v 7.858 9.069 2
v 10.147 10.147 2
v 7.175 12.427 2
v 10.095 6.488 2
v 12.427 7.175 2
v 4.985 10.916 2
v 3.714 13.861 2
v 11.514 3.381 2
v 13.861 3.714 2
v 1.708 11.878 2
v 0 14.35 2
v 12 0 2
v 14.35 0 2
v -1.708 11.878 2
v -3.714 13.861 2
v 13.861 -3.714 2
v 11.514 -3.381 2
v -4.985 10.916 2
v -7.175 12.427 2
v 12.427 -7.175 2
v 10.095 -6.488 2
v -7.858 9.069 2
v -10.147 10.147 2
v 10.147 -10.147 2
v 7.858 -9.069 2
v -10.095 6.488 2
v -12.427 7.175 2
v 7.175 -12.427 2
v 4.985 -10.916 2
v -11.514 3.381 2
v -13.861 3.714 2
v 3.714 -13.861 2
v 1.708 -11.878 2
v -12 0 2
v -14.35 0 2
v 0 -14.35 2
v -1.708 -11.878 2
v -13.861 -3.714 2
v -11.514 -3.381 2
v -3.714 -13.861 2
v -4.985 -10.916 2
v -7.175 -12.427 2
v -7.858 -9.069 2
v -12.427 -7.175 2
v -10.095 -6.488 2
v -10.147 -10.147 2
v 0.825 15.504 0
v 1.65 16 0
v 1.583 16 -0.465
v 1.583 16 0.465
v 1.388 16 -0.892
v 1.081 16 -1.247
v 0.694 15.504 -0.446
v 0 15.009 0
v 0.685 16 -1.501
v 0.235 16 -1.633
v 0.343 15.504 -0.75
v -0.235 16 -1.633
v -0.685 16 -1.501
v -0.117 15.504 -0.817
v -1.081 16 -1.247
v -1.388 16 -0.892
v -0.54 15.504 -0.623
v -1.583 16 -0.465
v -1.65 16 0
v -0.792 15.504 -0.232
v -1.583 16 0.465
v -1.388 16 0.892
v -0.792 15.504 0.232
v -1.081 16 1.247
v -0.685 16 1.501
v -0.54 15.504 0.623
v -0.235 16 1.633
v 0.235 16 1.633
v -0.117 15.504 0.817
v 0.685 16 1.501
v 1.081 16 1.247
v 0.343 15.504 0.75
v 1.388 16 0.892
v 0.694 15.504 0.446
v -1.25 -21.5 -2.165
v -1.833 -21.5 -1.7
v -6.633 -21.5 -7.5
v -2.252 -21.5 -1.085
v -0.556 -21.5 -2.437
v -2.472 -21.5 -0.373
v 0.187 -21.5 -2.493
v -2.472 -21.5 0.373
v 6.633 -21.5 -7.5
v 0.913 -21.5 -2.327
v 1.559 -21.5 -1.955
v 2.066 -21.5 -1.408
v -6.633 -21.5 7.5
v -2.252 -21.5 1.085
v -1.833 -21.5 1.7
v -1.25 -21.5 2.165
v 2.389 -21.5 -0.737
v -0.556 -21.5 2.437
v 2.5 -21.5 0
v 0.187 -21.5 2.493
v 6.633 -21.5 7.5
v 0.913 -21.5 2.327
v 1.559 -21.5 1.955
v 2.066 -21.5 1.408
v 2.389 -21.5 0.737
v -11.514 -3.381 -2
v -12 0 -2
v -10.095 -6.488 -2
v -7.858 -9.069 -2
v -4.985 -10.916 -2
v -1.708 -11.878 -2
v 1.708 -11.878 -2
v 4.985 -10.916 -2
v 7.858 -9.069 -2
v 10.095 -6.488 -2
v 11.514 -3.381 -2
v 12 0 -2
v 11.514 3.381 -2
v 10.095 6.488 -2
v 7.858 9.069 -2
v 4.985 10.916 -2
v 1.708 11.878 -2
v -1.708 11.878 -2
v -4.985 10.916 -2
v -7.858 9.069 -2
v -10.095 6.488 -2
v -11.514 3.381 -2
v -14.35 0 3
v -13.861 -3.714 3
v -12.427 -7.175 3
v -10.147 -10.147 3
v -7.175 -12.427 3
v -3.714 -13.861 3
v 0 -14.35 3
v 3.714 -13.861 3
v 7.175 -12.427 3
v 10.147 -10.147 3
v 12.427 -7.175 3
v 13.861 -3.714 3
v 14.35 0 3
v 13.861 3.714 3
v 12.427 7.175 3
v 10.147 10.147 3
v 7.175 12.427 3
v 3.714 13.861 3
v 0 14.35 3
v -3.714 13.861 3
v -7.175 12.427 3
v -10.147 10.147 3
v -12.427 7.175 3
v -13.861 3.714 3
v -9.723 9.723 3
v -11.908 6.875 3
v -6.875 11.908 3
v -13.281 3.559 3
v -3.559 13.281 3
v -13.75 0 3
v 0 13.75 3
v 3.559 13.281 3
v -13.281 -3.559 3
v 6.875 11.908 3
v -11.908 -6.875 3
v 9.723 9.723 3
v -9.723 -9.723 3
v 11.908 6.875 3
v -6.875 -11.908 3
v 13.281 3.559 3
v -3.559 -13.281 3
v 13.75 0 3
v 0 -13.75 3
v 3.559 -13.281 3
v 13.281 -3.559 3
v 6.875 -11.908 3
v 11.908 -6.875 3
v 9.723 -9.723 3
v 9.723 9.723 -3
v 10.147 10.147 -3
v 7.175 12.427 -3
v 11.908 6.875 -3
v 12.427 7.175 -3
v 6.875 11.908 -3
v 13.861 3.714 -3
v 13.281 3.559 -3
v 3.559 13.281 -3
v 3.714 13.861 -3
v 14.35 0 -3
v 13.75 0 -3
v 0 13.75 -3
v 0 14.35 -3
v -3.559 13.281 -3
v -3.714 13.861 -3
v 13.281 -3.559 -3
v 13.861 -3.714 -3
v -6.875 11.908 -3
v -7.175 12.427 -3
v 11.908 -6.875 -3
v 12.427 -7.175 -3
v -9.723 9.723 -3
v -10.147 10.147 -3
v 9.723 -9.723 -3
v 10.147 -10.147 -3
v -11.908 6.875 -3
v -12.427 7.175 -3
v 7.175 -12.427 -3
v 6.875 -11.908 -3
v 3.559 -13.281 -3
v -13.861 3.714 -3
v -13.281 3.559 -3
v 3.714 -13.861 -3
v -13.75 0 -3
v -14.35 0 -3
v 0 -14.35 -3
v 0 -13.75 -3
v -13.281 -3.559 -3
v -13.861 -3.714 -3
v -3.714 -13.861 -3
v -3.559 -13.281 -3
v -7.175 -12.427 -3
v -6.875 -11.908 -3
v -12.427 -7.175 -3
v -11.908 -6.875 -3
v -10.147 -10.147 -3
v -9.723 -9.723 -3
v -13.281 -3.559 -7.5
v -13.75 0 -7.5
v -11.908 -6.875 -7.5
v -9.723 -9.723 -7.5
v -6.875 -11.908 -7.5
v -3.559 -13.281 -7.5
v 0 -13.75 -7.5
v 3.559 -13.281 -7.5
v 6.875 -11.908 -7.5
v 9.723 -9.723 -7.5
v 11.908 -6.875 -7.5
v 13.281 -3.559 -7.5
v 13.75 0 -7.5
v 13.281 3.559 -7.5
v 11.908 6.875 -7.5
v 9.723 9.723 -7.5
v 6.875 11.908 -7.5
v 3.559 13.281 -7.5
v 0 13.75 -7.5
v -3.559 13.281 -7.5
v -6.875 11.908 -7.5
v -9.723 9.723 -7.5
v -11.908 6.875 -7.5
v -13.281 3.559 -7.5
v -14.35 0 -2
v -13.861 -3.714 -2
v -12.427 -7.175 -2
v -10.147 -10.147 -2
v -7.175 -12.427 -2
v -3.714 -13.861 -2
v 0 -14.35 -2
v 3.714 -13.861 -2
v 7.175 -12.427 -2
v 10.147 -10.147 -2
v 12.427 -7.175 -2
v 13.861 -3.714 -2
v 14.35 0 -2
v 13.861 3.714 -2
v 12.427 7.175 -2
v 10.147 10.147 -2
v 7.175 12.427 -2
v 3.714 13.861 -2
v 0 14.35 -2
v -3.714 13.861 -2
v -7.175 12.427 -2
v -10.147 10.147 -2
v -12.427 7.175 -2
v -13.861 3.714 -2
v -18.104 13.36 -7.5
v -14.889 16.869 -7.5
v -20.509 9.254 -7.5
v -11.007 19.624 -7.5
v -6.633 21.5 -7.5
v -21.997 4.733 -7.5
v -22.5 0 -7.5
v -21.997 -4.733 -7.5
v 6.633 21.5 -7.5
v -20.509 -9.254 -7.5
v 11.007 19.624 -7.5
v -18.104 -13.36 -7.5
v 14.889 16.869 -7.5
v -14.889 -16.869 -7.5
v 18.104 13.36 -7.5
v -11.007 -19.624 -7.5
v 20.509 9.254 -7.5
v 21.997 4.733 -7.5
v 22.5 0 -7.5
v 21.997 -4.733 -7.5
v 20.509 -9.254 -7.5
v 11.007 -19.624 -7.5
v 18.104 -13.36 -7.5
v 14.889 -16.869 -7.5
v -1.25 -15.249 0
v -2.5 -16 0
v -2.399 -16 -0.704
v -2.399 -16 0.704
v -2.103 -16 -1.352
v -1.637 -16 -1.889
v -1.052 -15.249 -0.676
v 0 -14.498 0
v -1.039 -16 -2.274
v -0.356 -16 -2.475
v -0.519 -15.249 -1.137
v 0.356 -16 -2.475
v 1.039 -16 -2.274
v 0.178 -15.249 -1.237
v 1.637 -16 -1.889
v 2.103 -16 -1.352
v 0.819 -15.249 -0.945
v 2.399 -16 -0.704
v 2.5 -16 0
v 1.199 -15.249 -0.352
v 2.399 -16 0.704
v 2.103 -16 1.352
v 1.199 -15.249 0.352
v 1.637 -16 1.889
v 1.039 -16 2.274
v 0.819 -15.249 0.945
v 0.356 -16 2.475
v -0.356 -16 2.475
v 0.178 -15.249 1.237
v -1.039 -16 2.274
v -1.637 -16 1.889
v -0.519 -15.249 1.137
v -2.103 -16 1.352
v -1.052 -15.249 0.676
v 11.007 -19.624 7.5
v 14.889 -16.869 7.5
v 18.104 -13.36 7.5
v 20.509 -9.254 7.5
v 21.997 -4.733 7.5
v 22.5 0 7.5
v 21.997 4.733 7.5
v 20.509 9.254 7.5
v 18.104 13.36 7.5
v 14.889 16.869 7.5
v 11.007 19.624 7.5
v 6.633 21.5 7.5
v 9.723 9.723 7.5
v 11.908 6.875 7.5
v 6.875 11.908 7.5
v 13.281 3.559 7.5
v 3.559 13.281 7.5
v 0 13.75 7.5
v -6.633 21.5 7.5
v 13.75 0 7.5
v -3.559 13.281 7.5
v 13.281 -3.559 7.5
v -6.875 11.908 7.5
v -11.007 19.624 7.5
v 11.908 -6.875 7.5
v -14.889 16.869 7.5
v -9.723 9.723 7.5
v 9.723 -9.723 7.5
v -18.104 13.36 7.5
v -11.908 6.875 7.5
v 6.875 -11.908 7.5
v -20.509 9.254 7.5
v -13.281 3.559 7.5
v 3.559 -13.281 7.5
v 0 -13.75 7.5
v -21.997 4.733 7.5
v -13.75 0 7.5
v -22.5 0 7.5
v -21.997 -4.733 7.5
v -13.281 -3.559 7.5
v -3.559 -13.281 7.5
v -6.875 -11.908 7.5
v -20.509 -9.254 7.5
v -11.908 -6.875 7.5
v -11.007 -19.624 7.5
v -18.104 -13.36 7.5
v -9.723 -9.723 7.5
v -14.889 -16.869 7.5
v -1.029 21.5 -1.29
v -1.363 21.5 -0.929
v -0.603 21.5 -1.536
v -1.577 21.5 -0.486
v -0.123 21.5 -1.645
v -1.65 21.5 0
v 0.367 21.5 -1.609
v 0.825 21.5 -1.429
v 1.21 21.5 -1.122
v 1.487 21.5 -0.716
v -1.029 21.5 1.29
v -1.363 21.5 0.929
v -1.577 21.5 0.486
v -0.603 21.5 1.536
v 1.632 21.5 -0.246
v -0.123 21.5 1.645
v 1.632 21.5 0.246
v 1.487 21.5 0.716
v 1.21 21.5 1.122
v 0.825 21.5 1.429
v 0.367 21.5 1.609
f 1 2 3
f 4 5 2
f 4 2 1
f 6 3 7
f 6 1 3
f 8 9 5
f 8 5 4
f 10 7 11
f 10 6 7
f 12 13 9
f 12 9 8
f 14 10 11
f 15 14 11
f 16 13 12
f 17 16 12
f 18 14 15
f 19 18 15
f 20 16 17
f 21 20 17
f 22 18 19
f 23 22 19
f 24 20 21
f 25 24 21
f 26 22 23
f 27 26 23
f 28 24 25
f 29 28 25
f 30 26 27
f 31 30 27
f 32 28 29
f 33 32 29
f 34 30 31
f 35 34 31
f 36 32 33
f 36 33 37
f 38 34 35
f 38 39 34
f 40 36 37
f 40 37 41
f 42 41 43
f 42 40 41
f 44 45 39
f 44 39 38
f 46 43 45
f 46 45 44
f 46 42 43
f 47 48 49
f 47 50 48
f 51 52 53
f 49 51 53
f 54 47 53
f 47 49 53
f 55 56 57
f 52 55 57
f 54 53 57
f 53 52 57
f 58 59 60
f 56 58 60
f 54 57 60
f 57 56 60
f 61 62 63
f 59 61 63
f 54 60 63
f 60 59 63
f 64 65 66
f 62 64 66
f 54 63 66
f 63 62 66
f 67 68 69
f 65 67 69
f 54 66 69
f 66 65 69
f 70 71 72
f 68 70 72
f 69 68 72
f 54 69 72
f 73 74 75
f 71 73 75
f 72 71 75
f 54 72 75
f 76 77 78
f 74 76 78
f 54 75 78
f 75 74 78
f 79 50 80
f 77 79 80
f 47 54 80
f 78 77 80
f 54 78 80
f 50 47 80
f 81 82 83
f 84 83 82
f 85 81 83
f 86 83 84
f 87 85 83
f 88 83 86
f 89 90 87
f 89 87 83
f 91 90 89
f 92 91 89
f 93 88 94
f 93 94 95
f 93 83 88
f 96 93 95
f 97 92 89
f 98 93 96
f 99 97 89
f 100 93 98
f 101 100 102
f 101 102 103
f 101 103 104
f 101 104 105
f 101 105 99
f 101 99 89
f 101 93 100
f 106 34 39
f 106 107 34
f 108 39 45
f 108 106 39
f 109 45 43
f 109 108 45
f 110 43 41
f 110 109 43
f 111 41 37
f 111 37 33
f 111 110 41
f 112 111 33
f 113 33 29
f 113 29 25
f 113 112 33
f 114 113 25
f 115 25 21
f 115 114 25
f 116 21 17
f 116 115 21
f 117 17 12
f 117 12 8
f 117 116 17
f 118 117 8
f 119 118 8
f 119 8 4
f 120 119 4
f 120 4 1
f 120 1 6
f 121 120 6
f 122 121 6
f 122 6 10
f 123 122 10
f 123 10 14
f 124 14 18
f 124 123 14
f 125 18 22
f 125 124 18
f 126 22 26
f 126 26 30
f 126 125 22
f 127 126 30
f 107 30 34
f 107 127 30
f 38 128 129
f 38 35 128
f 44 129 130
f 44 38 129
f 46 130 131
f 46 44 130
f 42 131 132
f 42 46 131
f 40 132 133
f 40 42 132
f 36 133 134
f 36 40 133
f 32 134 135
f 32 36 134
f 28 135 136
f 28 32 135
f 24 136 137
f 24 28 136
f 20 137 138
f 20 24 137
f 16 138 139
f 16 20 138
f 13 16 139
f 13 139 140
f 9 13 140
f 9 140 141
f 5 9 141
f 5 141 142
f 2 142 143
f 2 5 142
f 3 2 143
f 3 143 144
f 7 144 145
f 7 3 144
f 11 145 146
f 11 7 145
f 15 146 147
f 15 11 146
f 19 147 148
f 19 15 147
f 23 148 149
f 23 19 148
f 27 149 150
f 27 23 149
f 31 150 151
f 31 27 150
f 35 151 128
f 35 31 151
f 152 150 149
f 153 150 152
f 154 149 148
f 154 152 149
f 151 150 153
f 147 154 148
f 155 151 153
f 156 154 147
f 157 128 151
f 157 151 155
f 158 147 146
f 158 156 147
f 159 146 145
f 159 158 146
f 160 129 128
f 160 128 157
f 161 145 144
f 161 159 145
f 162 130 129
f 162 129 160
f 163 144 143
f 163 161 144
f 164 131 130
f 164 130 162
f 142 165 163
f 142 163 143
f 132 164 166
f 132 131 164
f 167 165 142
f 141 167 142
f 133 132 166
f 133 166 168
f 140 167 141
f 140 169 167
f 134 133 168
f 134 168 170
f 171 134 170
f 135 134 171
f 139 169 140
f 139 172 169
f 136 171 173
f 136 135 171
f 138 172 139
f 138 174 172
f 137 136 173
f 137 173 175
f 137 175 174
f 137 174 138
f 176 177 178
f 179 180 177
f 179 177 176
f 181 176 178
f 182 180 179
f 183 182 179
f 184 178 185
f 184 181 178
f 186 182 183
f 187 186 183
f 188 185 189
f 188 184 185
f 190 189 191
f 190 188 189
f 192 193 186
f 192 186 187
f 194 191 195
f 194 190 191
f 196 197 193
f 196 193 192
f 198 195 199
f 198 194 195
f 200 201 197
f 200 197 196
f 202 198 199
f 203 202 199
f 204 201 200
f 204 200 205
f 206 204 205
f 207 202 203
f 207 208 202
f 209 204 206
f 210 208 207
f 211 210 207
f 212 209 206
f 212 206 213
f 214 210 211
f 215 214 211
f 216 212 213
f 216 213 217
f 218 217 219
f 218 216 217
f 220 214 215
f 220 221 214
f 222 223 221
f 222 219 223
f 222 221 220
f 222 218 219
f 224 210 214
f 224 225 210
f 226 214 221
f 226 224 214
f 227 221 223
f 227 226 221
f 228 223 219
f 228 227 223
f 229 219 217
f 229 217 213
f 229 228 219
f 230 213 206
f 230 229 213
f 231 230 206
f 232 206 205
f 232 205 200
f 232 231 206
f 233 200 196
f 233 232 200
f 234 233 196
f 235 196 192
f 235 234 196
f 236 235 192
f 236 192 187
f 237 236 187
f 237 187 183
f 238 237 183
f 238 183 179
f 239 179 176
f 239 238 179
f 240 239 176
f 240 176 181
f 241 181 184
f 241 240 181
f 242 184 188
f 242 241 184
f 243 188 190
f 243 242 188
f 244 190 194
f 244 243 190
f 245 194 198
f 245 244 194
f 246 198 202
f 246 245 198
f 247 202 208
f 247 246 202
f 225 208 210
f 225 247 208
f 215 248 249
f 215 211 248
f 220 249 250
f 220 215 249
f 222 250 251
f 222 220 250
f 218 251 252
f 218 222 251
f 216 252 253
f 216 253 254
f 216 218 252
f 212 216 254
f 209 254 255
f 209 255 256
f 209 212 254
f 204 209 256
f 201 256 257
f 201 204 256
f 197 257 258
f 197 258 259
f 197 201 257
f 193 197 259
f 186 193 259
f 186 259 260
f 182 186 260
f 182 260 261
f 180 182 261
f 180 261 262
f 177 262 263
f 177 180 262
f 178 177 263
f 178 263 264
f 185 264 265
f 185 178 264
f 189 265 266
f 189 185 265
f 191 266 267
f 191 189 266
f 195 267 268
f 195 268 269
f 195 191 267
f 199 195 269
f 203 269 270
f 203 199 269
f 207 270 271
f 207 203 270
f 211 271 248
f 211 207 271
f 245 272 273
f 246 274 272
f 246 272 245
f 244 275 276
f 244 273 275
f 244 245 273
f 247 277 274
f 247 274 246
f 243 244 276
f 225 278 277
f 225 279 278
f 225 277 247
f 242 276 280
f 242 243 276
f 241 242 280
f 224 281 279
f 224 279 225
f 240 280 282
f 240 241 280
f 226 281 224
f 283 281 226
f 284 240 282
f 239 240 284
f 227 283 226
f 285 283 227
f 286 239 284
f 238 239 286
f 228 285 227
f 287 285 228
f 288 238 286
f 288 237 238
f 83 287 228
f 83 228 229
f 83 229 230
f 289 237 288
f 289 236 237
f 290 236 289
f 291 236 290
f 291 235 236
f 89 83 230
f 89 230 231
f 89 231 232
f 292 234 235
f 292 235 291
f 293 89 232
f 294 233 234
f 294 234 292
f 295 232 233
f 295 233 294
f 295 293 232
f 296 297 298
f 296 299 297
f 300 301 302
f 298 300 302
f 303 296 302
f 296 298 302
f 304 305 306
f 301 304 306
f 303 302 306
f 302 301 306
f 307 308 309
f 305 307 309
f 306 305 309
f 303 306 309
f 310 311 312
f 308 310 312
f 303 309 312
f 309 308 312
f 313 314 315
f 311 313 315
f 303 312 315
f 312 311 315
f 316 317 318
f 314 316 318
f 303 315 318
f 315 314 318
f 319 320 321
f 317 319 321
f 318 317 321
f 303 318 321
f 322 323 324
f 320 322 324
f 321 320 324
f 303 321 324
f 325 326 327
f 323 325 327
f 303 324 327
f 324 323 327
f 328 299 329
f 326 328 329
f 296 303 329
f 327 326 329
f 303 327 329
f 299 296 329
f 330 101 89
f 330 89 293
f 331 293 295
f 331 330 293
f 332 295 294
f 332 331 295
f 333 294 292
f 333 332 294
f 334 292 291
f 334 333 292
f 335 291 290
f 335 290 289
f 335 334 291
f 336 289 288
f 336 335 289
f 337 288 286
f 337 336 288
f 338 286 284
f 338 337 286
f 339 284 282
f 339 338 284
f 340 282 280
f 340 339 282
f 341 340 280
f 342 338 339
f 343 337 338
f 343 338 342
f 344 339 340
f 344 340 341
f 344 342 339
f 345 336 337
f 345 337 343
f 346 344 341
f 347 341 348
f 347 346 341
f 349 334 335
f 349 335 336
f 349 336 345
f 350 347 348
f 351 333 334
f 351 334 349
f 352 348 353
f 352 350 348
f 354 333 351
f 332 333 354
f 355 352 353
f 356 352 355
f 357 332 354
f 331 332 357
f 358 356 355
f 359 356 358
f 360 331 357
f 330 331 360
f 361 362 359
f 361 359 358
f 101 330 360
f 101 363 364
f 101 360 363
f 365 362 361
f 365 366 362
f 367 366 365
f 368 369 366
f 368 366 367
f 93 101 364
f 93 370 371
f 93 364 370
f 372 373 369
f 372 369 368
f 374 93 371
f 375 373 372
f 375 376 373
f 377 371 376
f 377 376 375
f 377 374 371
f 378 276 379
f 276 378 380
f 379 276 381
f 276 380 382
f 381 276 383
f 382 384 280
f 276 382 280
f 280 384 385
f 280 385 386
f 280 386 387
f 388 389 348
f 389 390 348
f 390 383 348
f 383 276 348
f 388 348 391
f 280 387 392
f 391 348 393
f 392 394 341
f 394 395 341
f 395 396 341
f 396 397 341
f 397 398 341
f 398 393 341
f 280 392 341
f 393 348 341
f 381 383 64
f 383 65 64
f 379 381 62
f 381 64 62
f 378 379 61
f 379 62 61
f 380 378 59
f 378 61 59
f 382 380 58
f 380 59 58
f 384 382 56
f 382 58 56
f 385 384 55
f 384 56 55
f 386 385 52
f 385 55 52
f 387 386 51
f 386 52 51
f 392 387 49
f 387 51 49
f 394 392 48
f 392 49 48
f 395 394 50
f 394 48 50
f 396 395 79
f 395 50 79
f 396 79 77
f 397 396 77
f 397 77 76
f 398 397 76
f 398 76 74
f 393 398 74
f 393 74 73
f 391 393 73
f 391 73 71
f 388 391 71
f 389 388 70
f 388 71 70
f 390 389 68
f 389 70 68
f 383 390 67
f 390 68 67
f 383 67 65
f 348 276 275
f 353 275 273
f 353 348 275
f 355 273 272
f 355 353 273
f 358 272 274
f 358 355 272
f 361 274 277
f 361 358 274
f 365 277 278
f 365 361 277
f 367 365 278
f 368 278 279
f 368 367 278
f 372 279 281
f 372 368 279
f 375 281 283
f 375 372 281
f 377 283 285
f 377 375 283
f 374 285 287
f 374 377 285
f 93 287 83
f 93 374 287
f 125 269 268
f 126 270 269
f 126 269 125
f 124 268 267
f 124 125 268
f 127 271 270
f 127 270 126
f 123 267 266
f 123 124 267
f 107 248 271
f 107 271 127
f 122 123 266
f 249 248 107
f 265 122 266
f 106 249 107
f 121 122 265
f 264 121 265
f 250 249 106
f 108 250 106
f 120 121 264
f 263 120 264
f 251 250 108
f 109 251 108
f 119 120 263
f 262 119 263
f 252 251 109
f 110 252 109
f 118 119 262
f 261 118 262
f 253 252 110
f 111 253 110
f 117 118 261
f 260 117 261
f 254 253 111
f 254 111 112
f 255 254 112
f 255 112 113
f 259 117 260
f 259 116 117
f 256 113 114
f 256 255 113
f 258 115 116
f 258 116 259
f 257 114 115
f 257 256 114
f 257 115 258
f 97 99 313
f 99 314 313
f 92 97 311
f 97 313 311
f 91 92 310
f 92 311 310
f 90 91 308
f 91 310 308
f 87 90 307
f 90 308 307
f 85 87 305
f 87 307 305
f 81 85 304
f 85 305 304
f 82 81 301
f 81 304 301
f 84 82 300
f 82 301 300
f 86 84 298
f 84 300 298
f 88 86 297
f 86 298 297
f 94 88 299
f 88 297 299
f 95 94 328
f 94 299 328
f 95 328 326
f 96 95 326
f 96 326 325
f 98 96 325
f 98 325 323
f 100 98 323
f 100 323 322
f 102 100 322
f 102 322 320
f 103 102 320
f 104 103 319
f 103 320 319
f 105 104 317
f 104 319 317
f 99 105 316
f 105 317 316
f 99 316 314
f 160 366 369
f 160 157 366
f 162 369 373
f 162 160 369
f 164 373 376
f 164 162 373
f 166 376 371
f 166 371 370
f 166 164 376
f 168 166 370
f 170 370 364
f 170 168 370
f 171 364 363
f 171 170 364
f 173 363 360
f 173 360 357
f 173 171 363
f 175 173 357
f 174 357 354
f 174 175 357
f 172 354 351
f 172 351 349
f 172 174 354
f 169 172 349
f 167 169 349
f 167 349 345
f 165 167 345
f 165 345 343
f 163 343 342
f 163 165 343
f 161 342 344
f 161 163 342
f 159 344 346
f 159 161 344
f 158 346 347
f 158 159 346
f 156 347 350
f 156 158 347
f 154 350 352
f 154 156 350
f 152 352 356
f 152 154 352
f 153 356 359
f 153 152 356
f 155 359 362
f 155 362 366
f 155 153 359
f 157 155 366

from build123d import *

# Parameters (mm, degrees)
SKETCH_2_W             = 64.02174429
SKETCH_2_H             = 9.248919907
CUT_EXTRUDE_1_DEPTH    = 49
HOLE_WIZARD_M4_2_D     = 3.3
HOLE_WIZARD_M4_2_DEPTH = 5.5
HOLE_WIZARD_M4_2_TIP   = 0.991420021
HOLE_WIZARD_M6_2_D     = 5
HOLE_WIZARD_M6_2_DEPTH = 5.5
HOLE_WIZARD_M6_2_TIP   = 1.502151548


with BuildPart() as part:
    # 草图1 → 旋转1 (revolve)
    with BuildSketch(Plane(origin=(0, 0, 0), x_dir=(1, 0, 0), z_dir=(0, 1, 0)), mode=Mode.PRIVATE) as revolve_1_sk:
        Polygon((22.5, 7.5), (22.5, -7.5), (13.75, -7.5), (13.75, -3), (14.35, -3), (14.35, -2), (12, -2), (12, 2), (14.35, 2), (14.35, 3), (13.75, 3), (13.75, 7.5), align=None)
    revolve(revolve_1_sk.sketch.rotate(Axis((0, 0, -31.9390681), (0, 0, 1)), 180), axis=Axis((0, 0, -31.9390681), (0, 0, 1)))  # turned: the seam where the file's is

    # 草图2 → 切除-拉伸1 (cut)
    with BuildSketch(Plane.XY.offset(7.5)):
        with Locations((-1.141100508, 26.124459954)):
            Rectangle(SKETCH_2_W, SKETCH_2_H)
        with Locations((-1.141100508, -26.124459954)):
            Rectangle(SKETCH_2_W, SKETCH_2_H)
    extrude(amount=-CUT_EXTRUDE_1_DEPTH, mode=Mode.SUBTRACT)

    # M4 螺纹孔2
    with Locations(Plane(origin=(0, 21.5, 0), x_dir=(1, 0, 0), z_dir=(0, 1, 0))):
        with Locations((0, 0)):
            Hole(HOLE_WIZARD_M4_2_D / 2, depth=HOLE_WIZARD_M4_2_DEPTH)
            with Locations((0, 0, -(HOLE_WIZARD_M4_2_DEPTH + HOLE_WIZARD_M4_2_TIP / 2))):  # 118° drill point
                Cone(0, HOLE_WIZARD_M4_2_D / 2, HOLE_WIZARD_M4_2_TIP, mode=Mode.SUBTRACT)

    # M6 螺纹孔2
    with Locations(Plane(origin=(0, -21.5, 0), x_dir=(-1, 0, 0), z_dir=(0, -1, 0))):
        with Locations((0, 0)):
            Hole(HOLE_WIZARD_M6_2_D / 2, depth=HOLE_WIZARD_M6_2_DEPTH)
            with Locations((0, 0, -(HOLE_WIZARD_M6_2_DEPTH + HOLE_WIZARD_M6_2_TIP / 2))):  # 118° drill point
                Cone(0, HOLE_WIZARD_M6_2_D / 2, HOLE_WIZARD_M6_2_TIP, mode=Mode.SUBTRACT)


solid = part.part
